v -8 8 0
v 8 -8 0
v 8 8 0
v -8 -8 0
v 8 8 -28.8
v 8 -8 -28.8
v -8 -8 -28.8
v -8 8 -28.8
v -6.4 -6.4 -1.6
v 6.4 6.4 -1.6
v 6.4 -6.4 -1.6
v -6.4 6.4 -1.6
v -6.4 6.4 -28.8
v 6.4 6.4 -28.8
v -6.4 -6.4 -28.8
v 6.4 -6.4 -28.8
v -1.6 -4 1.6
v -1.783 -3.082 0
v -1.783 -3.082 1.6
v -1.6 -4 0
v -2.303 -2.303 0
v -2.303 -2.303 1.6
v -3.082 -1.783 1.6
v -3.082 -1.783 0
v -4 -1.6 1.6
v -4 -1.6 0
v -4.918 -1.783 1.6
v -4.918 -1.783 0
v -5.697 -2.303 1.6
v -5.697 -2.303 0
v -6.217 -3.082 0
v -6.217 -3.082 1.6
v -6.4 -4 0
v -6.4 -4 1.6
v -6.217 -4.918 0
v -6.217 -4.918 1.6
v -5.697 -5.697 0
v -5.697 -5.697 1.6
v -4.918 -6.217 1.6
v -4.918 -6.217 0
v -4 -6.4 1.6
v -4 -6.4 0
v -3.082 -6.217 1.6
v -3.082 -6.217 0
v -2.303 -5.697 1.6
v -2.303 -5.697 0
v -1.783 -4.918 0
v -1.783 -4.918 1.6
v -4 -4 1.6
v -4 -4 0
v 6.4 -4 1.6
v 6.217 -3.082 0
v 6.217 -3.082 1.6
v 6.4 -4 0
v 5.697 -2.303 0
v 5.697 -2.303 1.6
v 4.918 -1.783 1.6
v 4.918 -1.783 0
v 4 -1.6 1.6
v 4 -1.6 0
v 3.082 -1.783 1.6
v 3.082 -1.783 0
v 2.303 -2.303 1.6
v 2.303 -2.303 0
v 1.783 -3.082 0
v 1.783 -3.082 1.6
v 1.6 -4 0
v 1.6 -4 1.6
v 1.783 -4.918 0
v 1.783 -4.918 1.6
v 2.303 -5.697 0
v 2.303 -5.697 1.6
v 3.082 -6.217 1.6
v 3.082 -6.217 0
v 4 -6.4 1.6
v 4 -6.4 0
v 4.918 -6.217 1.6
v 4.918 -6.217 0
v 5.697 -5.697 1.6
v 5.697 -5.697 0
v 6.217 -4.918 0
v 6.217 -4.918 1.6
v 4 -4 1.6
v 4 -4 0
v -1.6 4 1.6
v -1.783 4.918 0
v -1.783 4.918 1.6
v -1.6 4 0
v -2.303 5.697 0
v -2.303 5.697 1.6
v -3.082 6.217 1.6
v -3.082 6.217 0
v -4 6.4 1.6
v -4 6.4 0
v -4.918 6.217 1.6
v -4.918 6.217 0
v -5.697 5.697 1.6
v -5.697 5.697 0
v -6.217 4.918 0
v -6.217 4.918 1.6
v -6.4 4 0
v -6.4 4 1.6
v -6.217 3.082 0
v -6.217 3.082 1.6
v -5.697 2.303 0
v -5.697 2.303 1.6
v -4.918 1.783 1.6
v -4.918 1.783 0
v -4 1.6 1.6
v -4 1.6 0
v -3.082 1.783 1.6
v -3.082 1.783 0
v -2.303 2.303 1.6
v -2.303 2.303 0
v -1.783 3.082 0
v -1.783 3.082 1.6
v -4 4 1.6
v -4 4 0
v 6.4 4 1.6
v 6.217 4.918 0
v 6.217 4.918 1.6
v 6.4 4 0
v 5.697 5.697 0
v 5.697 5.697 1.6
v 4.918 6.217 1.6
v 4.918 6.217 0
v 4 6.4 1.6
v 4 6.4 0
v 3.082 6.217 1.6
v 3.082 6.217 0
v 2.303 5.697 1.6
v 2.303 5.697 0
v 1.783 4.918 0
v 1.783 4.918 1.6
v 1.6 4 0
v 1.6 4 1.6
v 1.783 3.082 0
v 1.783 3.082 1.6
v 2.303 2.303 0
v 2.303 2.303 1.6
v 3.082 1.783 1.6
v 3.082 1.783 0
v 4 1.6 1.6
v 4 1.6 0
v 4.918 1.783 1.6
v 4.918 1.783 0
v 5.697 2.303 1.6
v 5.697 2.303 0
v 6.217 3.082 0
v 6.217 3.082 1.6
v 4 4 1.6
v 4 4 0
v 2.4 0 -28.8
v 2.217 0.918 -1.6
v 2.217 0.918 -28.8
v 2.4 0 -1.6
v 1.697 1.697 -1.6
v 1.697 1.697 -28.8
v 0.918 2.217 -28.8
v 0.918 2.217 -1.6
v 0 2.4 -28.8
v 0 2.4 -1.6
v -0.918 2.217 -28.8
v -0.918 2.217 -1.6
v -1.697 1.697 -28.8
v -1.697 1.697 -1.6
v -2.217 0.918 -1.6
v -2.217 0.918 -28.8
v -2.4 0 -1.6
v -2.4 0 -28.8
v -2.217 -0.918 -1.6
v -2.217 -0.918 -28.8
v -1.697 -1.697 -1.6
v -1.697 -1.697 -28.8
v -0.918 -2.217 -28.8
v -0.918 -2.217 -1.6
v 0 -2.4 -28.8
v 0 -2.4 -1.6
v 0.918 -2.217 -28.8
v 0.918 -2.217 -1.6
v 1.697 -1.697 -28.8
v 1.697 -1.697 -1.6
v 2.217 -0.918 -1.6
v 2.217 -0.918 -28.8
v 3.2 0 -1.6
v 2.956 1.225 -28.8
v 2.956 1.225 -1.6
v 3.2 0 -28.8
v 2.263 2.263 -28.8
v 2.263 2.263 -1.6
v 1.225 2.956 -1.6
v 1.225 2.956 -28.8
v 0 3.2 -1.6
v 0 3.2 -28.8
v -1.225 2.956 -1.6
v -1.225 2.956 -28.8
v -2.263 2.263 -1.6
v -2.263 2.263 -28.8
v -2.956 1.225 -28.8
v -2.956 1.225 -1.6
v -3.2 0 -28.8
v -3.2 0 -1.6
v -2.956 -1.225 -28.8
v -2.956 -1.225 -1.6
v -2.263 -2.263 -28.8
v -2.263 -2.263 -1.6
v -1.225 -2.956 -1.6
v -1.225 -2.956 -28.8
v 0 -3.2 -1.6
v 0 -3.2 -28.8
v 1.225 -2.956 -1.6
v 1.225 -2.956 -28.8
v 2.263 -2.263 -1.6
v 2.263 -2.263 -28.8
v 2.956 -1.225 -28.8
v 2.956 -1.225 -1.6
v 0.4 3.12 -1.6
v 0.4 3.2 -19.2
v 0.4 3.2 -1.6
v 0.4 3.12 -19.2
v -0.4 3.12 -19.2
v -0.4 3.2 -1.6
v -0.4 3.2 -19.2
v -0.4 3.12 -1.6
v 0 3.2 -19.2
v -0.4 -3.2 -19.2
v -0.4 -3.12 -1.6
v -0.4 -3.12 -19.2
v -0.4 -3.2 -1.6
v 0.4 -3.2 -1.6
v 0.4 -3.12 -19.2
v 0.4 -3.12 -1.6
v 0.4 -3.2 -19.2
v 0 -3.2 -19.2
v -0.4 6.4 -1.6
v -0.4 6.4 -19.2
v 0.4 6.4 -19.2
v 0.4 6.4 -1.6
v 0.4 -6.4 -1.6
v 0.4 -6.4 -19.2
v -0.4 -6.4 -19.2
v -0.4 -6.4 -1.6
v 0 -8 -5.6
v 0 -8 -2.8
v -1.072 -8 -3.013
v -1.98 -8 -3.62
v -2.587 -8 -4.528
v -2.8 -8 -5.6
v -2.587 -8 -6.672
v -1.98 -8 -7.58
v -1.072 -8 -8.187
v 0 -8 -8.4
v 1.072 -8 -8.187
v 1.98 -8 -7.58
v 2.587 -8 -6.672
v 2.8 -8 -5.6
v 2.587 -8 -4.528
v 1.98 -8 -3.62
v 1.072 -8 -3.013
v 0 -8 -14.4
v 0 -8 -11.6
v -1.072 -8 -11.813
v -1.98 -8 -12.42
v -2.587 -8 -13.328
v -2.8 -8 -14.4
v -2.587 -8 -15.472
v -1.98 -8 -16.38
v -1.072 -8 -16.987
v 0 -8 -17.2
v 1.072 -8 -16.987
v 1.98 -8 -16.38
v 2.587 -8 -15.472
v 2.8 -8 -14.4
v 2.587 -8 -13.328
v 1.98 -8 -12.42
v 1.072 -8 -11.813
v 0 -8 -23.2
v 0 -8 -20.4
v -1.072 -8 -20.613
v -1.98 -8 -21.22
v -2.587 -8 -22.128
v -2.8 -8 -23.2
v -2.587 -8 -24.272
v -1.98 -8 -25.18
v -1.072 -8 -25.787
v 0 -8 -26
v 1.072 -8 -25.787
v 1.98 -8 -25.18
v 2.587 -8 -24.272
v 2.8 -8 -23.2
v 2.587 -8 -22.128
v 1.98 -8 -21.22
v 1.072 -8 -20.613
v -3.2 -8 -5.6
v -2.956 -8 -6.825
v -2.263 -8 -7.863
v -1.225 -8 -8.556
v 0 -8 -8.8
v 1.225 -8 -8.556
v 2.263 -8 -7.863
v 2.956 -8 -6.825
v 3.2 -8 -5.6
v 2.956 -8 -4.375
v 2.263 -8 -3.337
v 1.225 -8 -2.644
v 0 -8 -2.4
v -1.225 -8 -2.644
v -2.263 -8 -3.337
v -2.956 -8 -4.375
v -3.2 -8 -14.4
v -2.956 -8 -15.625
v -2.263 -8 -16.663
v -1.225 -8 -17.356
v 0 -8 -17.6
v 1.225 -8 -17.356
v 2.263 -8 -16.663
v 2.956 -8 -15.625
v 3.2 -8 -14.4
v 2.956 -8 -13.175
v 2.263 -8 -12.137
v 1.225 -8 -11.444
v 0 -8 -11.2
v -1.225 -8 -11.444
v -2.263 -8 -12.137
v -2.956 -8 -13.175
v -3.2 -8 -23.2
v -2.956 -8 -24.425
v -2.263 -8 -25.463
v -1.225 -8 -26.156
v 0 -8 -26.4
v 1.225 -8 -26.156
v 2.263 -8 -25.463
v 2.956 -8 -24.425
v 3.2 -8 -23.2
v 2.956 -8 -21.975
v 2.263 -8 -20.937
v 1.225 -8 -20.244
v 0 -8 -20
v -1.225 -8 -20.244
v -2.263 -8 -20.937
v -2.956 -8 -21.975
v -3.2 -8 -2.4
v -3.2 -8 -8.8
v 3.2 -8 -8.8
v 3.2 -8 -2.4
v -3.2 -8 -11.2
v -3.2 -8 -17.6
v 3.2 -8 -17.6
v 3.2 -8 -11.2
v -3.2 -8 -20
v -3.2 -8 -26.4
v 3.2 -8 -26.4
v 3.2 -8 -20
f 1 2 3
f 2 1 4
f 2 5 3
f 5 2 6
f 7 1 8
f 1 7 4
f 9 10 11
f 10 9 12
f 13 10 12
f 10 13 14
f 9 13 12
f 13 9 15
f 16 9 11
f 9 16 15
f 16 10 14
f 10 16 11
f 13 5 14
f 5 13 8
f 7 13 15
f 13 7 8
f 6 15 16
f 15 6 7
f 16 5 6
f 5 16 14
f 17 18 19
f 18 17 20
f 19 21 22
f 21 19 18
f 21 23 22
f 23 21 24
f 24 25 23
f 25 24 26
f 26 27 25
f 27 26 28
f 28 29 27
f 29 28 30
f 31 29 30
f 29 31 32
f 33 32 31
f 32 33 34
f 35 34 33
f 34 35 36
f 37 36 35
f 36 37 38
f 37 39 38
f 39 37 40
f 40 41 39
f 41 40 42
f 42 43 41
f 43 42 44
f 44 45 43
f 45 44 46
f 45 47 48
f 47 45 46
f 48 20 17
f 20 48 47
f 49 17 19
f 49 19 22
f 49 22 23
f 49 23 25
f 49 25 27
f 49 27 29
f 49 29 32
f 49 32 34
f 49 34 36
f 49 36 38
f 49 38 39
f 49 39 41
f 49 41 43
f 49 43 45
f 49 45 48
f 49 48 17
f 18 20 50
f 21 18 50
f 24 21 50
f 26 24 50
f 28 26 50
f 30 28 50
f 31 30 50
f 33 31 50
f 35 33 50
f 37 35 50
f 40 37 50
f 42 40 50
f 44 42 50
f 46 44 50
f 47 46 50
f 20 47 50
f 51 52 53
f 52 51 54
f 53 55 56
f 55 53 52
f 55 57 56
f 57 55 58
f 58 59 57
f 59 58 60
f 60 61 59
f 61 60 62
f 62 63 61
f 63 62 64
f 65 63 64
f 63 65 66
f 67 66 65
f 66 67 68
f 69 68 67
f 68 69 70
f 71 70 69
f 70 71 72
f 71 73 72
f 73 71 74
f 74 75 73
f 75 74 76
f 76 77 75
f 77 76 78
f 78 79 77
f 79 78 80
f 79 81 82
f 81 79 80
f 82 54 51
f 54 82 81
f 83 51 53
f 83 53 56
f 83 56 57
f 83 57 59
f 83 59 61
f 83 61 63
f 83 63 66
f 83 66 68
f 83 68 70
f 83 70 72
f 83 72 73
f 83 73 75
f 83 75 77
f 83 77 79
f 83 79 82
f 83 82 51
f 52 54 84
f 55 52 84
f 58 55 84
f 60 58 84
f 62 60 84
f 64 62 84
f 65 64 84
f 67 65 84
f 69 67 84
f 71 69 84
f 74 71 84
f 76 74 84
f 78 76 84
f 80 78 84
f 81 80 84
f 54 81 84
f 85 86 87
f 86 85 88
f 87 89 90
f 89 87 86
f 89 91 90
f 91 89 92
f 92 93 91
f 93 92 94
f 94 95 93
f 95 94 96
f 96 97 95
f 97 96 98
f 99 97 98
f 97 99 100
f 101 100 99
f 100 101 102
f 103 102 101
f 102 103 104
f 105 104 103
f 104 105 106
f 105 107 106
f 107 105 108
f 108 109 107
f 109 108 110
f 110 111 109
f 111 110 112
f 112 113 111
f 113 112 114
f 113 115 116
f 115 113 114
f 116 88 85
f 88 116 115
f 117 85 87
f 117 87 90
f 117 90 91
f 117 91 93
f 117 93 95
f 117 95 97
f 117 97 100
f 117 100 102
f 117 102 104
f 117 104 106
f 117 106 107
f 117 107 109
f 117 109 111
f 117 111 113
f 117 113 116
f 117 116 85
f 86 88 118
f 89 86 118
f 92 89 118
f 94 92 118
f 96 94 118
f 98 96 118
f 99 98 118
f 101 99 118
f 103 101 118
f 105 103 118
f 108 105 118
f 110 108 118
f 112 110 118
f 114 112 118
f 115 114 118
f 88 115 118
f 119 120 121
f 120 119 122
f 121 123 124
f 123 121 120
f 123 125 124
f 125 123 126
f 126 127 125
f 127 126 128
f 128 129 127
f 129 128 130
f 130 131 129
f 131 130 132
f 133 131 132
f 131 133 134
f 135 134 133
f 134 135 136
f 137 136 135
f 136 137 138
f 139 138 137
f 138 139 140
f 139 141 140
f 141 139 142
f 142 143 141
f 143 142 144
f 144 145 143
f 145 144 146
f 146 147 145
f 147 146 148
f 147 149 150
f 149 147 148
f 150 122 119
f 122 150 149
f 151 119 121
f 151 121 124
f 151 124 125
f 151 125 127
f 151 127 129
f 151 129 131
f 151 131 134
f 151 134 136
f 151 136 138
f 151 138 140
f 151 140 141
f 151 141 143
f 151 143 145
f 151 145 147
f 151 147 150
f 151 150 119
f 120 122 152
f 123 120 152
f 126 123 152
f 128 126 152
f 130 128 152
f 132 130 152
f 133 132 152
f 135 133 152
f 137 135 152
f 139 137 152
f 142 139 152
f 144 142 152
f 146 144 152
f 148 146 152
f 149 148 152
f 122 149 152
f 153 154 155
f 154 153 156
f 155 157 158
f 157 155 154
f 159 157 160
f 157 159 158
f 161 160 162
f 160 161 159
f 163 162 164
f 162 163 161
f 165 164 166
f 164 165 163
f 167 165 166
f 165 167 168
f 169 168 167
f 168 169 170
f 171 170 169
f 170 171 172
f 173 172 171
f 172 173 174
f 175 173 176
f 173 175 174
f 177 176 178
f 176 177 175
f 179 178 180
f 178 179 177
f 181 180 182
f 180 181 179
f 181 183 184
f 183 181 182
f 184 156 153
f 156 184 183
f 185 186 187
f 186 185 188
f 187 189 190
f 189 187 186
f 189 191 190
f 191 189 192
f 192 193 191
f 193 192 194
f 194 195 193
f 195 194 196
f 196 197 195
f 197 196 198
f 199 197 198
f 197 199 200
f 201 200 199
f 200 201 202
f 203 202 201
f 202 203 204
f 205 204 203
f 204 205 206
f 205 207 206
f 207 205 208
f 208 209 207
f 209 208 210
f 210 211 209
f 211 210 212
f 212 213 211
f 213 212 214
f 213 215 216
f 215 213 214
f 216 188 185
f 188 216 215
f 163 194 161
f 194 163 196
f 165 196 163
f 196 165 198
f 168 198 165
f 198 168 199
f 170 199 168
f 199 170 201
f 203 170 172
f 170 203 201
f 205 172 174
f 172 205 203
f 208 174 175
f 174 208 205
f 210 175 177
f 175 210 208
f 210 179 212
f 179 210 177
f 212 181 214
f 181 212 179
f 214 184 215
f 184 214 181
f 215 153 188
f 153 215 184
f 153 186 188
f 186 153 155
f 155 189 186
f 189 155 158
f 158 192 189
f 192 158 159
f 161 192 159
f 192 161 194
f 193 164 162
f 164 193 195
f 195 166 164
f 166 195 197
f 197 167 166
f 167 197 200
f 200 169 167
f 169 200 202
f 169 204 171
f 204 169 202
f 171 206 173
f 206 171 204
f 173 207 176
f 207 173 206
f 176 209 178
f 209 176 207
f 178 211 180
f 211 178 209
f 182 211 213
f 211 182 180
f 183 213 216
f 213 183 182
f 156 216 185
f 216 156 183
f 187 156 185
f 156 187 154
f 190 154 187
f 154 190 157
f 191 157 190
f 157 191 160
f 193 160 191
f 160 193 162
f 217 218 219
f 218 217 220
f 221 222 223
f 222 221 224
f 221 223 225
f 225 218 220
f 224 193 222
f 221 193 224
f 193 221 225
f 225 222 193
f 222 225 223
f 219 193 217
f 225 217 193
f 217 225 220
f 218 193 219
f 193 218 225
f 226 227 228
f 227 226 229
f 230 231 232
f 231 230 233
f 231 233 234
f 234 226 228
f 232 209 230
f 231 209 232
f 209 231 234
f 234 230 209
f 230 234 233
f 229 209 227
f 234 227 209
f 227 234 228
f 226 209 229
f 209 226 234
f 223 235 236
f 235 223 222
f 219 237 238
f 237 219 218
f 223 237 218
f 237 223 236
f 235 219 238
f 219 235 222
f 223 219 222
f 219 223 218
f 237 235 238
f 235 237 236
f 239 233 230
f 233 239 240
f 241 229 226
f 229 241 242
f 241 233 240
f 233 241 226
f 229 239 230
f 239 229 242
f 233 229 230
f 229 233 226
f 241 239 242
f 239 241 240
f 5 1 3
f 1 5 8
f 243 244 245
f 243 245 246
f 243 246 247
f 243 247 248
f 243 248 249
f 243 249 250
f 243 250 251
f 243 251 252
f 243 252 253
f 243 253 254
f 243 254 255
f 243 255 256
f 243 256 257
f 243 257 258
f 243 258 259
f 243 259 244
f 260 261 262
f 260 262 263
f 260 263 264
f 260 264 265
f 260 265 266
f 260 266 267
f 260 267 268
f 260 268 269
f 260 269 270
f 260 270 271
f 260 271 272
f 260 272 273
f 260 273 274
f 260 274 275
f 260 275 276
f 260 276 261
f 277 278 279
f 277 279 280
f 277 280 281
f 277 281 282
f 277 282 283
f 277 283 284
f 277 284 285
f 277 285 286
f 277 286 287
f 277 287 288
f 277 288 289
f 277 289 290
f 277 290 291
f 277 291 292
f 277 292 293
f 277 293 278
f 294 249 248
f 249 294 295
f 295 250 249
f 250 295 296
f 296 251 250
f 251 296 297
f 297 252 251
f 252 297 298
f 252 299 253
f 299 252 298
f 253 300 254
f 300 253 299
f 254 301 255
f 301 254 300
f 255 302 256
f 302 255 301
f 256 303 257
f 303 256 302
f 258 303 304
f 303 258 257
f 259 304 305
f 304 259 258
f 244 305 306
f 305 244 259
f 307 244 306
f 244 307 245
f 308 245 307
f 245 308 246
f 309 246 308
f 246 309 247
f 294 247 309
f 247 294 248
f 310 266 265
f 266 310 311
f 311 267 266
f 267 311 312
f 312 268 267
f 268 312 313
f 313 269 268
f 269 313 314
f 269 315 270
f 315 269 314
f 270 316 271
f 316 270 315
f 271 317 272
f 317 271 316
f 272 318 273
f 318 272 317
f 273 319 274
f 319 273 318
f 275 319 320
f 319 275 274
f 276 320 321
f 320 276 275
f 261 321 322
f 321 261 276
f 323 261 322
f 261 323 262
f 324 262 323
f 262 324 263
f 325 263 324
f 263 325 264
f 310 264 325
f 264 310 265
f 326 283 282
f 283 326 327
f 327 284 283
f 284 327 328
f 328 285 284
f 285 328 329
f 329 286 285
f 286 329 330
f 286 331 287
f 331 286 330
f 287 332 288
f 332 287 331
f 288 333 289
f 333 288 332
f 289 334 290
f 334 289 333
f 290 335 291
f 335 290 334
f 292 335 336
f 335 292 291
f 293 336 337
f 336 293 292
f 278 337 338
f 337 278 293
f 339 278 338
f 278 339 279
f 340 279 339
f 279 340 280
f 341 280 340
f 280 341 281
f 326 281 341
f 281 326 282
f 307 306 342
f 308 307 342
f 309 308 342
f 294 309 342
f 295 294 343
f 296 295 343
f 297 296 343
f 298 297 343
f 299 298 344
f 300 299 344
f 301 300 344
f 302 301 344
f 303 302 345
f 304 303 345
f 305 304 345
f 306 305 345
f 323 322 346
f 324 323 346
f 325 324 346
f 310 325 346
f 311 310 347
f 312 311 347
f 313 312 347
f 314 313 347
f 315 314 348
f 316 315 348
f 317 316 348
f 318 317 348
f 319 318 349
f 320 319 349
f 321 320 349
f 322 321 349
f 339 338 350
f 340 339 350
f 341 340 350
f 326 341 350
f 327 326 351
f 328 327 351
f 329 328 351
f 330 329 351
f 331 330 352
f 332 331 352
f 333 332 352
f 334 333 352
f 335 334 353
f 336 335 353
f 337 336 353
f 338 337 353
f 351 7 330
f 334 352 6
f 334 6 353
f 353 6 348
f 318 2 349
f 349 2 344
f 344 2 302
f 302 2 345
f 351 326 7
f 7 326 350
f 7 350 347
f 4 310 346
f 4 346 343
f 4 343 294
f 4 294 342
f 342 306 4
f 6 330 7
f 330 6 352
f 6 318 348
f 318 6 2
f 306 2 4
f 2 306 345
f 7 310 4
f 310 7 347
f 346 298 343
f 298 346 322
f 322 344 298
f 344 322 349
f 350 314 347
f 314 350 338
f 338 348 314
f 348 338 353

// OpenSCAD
use <../lib.scad>
use <../p/4-4disc.scad>
use <../p/4-4ndis.scad>
use <../p/4-4ring7.scad>
use <s/30145s01.scad>
function ldraw_lib__30145p02() = [
// 0 Brick  2 x  2 x  3 with 3 Green Dots Pattern
// 0 Name: 30145p02.dat
// 0 Author: Chris Böhnke [KnightOfTarenta]
// 0 !LDRAW_ORG Part UPDATE 2026-09
// 0 !LICENSE Licensed under CC BY 4.0 : see CAreadme.txt
// 
// 0 BFC CERTIFY CCW
  [0,"BFC","CERTIFY"],
  [0,"BFC","CCW"],
// 
// 0 !CATEGORY Brick
// 0 !KEYWORDS Basic 1998, Brickowl 429736, Brickset 82635, Classic 1998, dacta
// 0 !KEYWORDS Freestyle, Rebrickable 30145pr0003, Set 4148, Set 4216, Set 9250
// 
// 0 !HISTORY 2002-08-18 [PTadmin] Official Update 2002-04
// 0 !HISTORY 2007-06-06 [PTadmin] Header formatted for Contributor Agreement
// 0 !HISTORY 2008-07-01 [PTadmin] Official Update 2008-01
// 0 !HISTORY 2009-10-21 [Philo] BFCed
// 0 !HISTORY 2009-12-29 [PTadmin] Official Update 2009-03
// 0 !HISTORY 2025-02-21 [KnightOfTarenta] Complete Rewrite, Original by Damien Guichard [BrickCaster]
// 0 !HISTORY 2026-09-30 [OrionP] Official Update 2026-09
// 
// 0 // Original by Damien Guichard [BrickCaster]
// 
// 0 // Base Part
// 1 16 0 0 0 1 0 0 0 1 0 0 0 1 s\30145s01.dat
  [1,16,0,0,0,1,0,0,0,1,0,0,0,1, ldraw_lib__s__30145s01()],
// 
// 0 // Back
// 4 16 -20 0 20 20 0 20 20 72 20 -20 72 20
  [4,16,-20,0,20,20,0,20,20,72,20,-20,72,20],
// 
// 0 // Pattern
// 1 2 0 14 -20 0 0 -7 -7 0 0 0 1 0 4-4disc.dat
  [1,2,0,14,-20,0,0,-7,-7,0,0,0,1,0, ldraw_lib__4_4disc()],
// 1 2 0 36 -20 0 0 -7 -7 0 0 0 1 0 4-4disc.dat
  [1,2,0,36,-20,0,0,-7,-7,0,0,0,1,0, ldraw_lib__4_4disc()],
// 1 2 0 58 -20 0 0 -7 -7 0 0 0 1 0 4-4disc.dat
  [1,2,0,58,-20,0,0,-7,-7,0,0,0,1,0, ldraw_lib__4_4disc()],
// 1 0 0 14 -20 0 0 -1 -1 0 0 0 1 0 4-4ring7.dat
  [1,0,0,14,-20,0,0,-1,-1,0,0,0,1,0, ldraw_lib__4_4ring7()],
// 1 0 0 36 -20 0 0 -1 -1 0 0 0 1 0 4-4ring7.dat
  [1,0,0,36,-20,0,0,-1,-1,0,0,0,1,0, ldraw_lib__4_4ring7()],
// 1 0 0 58 -20 0 0 -1 -1 0 0 0 1 0 4-4ring7.dat
  [1,0,0,58,-20,0,0,-1,-1,0,0,0,1,0, ldraw_lib__4_4ring7()],
// 1 16 0 14 -20 0 0 -8 -8 0 0 0 1 0 4-4ndis.dat
  [1,16,0,14,-20,0,0,-8,-8,0,0,0,1,0, ldraw_lib__4_4ndis()],
// 1 16 0 36 -20 0 0 -8 -8 0 0 0 1 0 4-4ndis.dat
  [1,16,0,36,-20,0,0,-8,-8,0,0,0,1,0, ldraw_lib__4_4ndis()],
// 1 16 0 58 -20 0 0 -8 -8 0 0 0 1 0 4-4ndis.dat
  [1,16,0,58,-20,0,0,-8,-8,0,0,0,1,0, ldraw_lib__4_4ndis()],
// 3 16 -8 66 -20 -20 72 -20 0 66 -20
  [3,16,-8,66,-20,-20,72,-20,0,66,-20],
// 3 16 8 58 -20 8 66 -20 20 72 -20
  [3,16,8,58,-20,8,66,-20,20,72,-20],
// 3 16 8 58 -20 20 72 -20 8 50 -20
  [3,16,8,58,-20,20,72,-20,8,50,-20],
// 3 16 8 50 -20 20 72 -20 8 44 -20
  [3,16,8,50,-20,20,72,-20,8,44,-20],
// 3 16 8 36 -20 20 0 -20 8 28 -20
  [3,16,8,36,-20,20,0,-20,8,28,-20],
// 3 16 8 28 -20 20 0 -20 8 22 -20
  [3,16,8,28,-20,20,0,-20,8,22,-20],
// 3 16 8 22 -20 20 0 -20 8 14 -20
  [3,16,8,22,-20,20,0,-20,8,14,-20],
// 3 16 8 14 -20 20 0 -20 8 6 -20
  [3,16,8,14,-20,20,0,-20,8,6,-20],
// 3 16 -8 66 -20 -8 58 -20 -20 72 -20
  [3,16,-8,66,-20,-8,58,-20,-20,72,-20],
// 3 16 -20 72 -20 -8 58 -20 -8 50 -20
  [3,16,-20,72,-20,-8,58,-20,-8,50,-20],
// 3 16 -20 72 -20 -8 50 -20 -8 44 -20
  [3,16,-20,72,-20,-8,50,-20,-8,44,-20],
// 3 16 -20 0 -20 -8 36 -20 -8 28 -20
  [3,16,-20,0,-20,-8,36,-20,-8,28,-20],
// 3 16 -20 0 -20 -8 28 -20 -8 22 -20
  [3,16,-20,0,-20,-8,28,-20,-8,22,-20],
// 3 16 -20 0 -20 -8 22 -20 -8 14 -20
  [3,16,-20,0,-20,-8,22,-20,-8,14,-20],
// 3 16 -20 0 -20 -8 14 -20 -8 6 -20
  [3,16,-20,0,-20,-8,14,-20,-8,6,-20],
// 3 16 -8 6 -20 0 6 -20 -20 0 -20
  [3,16,-8,6,-20,0,6,-20,-20,0,-20],
// 4 16 -20 72 -20 20 72 -20 8 66 -20 0 66 -20
  [4,16,-20,72,-20,20,72,-20,8,66,-20,0,66,-20],
// 4 16 8 44 -20 20 72 -20 20 0 -20 8 36 -20
  [4,16,8,44,-20,20,72,-20,20,0,-20,8,36,-20],
// 4 16 8 6 -20 20 0 -20 -20 0 -20 0 6 -20
  [4,16,8,6,-20,20,0,-20,-20,0,-20,0,6,-20],
// 4 16 -8 44 -20 -8 36 -20 -20 0 -20 -20 72 -20
  [4,16,-8,44,-20,-8,36,-20,-20,0,-20,-20,72,-20],
// 4 16 -8 28 -20 0 28 -20 0 22 -20 -8 22 -20
  [4,16,-8,28,-20,0,28,-20,0,22,-20,-8,22,-20],
// 4 16 0 28 -20 8 28 -20 8 22 -20 0 22 -20
  [4,16,0,28,-20,8,28,-20,8,22,-20,0,22,-20],
// 4 16 -8 50 -20 0 50 -20 0 44 -20 -8 44 -20
  [4,16,-8,50,-20,0,50,-20,0,44,-20,-8,44,-20],
// 4 16 8 50 -20 8 44 -20 0 44 -20 0 50 -20
  [4,16,8,50,-20,8,44,-20,0,44,-20,0,50,-20],
];
module ldraw_lib__30145p02(step=0, col=false, unit=2/5, alt=false, line=0.2, solid=!$preview)
    makepoly(ldraw_lib__30145p02(), step=step, col=col, unit=unit, alt=alt, line=line, solid=solid);
ldraw_lib__30145p02(line=0.2);
